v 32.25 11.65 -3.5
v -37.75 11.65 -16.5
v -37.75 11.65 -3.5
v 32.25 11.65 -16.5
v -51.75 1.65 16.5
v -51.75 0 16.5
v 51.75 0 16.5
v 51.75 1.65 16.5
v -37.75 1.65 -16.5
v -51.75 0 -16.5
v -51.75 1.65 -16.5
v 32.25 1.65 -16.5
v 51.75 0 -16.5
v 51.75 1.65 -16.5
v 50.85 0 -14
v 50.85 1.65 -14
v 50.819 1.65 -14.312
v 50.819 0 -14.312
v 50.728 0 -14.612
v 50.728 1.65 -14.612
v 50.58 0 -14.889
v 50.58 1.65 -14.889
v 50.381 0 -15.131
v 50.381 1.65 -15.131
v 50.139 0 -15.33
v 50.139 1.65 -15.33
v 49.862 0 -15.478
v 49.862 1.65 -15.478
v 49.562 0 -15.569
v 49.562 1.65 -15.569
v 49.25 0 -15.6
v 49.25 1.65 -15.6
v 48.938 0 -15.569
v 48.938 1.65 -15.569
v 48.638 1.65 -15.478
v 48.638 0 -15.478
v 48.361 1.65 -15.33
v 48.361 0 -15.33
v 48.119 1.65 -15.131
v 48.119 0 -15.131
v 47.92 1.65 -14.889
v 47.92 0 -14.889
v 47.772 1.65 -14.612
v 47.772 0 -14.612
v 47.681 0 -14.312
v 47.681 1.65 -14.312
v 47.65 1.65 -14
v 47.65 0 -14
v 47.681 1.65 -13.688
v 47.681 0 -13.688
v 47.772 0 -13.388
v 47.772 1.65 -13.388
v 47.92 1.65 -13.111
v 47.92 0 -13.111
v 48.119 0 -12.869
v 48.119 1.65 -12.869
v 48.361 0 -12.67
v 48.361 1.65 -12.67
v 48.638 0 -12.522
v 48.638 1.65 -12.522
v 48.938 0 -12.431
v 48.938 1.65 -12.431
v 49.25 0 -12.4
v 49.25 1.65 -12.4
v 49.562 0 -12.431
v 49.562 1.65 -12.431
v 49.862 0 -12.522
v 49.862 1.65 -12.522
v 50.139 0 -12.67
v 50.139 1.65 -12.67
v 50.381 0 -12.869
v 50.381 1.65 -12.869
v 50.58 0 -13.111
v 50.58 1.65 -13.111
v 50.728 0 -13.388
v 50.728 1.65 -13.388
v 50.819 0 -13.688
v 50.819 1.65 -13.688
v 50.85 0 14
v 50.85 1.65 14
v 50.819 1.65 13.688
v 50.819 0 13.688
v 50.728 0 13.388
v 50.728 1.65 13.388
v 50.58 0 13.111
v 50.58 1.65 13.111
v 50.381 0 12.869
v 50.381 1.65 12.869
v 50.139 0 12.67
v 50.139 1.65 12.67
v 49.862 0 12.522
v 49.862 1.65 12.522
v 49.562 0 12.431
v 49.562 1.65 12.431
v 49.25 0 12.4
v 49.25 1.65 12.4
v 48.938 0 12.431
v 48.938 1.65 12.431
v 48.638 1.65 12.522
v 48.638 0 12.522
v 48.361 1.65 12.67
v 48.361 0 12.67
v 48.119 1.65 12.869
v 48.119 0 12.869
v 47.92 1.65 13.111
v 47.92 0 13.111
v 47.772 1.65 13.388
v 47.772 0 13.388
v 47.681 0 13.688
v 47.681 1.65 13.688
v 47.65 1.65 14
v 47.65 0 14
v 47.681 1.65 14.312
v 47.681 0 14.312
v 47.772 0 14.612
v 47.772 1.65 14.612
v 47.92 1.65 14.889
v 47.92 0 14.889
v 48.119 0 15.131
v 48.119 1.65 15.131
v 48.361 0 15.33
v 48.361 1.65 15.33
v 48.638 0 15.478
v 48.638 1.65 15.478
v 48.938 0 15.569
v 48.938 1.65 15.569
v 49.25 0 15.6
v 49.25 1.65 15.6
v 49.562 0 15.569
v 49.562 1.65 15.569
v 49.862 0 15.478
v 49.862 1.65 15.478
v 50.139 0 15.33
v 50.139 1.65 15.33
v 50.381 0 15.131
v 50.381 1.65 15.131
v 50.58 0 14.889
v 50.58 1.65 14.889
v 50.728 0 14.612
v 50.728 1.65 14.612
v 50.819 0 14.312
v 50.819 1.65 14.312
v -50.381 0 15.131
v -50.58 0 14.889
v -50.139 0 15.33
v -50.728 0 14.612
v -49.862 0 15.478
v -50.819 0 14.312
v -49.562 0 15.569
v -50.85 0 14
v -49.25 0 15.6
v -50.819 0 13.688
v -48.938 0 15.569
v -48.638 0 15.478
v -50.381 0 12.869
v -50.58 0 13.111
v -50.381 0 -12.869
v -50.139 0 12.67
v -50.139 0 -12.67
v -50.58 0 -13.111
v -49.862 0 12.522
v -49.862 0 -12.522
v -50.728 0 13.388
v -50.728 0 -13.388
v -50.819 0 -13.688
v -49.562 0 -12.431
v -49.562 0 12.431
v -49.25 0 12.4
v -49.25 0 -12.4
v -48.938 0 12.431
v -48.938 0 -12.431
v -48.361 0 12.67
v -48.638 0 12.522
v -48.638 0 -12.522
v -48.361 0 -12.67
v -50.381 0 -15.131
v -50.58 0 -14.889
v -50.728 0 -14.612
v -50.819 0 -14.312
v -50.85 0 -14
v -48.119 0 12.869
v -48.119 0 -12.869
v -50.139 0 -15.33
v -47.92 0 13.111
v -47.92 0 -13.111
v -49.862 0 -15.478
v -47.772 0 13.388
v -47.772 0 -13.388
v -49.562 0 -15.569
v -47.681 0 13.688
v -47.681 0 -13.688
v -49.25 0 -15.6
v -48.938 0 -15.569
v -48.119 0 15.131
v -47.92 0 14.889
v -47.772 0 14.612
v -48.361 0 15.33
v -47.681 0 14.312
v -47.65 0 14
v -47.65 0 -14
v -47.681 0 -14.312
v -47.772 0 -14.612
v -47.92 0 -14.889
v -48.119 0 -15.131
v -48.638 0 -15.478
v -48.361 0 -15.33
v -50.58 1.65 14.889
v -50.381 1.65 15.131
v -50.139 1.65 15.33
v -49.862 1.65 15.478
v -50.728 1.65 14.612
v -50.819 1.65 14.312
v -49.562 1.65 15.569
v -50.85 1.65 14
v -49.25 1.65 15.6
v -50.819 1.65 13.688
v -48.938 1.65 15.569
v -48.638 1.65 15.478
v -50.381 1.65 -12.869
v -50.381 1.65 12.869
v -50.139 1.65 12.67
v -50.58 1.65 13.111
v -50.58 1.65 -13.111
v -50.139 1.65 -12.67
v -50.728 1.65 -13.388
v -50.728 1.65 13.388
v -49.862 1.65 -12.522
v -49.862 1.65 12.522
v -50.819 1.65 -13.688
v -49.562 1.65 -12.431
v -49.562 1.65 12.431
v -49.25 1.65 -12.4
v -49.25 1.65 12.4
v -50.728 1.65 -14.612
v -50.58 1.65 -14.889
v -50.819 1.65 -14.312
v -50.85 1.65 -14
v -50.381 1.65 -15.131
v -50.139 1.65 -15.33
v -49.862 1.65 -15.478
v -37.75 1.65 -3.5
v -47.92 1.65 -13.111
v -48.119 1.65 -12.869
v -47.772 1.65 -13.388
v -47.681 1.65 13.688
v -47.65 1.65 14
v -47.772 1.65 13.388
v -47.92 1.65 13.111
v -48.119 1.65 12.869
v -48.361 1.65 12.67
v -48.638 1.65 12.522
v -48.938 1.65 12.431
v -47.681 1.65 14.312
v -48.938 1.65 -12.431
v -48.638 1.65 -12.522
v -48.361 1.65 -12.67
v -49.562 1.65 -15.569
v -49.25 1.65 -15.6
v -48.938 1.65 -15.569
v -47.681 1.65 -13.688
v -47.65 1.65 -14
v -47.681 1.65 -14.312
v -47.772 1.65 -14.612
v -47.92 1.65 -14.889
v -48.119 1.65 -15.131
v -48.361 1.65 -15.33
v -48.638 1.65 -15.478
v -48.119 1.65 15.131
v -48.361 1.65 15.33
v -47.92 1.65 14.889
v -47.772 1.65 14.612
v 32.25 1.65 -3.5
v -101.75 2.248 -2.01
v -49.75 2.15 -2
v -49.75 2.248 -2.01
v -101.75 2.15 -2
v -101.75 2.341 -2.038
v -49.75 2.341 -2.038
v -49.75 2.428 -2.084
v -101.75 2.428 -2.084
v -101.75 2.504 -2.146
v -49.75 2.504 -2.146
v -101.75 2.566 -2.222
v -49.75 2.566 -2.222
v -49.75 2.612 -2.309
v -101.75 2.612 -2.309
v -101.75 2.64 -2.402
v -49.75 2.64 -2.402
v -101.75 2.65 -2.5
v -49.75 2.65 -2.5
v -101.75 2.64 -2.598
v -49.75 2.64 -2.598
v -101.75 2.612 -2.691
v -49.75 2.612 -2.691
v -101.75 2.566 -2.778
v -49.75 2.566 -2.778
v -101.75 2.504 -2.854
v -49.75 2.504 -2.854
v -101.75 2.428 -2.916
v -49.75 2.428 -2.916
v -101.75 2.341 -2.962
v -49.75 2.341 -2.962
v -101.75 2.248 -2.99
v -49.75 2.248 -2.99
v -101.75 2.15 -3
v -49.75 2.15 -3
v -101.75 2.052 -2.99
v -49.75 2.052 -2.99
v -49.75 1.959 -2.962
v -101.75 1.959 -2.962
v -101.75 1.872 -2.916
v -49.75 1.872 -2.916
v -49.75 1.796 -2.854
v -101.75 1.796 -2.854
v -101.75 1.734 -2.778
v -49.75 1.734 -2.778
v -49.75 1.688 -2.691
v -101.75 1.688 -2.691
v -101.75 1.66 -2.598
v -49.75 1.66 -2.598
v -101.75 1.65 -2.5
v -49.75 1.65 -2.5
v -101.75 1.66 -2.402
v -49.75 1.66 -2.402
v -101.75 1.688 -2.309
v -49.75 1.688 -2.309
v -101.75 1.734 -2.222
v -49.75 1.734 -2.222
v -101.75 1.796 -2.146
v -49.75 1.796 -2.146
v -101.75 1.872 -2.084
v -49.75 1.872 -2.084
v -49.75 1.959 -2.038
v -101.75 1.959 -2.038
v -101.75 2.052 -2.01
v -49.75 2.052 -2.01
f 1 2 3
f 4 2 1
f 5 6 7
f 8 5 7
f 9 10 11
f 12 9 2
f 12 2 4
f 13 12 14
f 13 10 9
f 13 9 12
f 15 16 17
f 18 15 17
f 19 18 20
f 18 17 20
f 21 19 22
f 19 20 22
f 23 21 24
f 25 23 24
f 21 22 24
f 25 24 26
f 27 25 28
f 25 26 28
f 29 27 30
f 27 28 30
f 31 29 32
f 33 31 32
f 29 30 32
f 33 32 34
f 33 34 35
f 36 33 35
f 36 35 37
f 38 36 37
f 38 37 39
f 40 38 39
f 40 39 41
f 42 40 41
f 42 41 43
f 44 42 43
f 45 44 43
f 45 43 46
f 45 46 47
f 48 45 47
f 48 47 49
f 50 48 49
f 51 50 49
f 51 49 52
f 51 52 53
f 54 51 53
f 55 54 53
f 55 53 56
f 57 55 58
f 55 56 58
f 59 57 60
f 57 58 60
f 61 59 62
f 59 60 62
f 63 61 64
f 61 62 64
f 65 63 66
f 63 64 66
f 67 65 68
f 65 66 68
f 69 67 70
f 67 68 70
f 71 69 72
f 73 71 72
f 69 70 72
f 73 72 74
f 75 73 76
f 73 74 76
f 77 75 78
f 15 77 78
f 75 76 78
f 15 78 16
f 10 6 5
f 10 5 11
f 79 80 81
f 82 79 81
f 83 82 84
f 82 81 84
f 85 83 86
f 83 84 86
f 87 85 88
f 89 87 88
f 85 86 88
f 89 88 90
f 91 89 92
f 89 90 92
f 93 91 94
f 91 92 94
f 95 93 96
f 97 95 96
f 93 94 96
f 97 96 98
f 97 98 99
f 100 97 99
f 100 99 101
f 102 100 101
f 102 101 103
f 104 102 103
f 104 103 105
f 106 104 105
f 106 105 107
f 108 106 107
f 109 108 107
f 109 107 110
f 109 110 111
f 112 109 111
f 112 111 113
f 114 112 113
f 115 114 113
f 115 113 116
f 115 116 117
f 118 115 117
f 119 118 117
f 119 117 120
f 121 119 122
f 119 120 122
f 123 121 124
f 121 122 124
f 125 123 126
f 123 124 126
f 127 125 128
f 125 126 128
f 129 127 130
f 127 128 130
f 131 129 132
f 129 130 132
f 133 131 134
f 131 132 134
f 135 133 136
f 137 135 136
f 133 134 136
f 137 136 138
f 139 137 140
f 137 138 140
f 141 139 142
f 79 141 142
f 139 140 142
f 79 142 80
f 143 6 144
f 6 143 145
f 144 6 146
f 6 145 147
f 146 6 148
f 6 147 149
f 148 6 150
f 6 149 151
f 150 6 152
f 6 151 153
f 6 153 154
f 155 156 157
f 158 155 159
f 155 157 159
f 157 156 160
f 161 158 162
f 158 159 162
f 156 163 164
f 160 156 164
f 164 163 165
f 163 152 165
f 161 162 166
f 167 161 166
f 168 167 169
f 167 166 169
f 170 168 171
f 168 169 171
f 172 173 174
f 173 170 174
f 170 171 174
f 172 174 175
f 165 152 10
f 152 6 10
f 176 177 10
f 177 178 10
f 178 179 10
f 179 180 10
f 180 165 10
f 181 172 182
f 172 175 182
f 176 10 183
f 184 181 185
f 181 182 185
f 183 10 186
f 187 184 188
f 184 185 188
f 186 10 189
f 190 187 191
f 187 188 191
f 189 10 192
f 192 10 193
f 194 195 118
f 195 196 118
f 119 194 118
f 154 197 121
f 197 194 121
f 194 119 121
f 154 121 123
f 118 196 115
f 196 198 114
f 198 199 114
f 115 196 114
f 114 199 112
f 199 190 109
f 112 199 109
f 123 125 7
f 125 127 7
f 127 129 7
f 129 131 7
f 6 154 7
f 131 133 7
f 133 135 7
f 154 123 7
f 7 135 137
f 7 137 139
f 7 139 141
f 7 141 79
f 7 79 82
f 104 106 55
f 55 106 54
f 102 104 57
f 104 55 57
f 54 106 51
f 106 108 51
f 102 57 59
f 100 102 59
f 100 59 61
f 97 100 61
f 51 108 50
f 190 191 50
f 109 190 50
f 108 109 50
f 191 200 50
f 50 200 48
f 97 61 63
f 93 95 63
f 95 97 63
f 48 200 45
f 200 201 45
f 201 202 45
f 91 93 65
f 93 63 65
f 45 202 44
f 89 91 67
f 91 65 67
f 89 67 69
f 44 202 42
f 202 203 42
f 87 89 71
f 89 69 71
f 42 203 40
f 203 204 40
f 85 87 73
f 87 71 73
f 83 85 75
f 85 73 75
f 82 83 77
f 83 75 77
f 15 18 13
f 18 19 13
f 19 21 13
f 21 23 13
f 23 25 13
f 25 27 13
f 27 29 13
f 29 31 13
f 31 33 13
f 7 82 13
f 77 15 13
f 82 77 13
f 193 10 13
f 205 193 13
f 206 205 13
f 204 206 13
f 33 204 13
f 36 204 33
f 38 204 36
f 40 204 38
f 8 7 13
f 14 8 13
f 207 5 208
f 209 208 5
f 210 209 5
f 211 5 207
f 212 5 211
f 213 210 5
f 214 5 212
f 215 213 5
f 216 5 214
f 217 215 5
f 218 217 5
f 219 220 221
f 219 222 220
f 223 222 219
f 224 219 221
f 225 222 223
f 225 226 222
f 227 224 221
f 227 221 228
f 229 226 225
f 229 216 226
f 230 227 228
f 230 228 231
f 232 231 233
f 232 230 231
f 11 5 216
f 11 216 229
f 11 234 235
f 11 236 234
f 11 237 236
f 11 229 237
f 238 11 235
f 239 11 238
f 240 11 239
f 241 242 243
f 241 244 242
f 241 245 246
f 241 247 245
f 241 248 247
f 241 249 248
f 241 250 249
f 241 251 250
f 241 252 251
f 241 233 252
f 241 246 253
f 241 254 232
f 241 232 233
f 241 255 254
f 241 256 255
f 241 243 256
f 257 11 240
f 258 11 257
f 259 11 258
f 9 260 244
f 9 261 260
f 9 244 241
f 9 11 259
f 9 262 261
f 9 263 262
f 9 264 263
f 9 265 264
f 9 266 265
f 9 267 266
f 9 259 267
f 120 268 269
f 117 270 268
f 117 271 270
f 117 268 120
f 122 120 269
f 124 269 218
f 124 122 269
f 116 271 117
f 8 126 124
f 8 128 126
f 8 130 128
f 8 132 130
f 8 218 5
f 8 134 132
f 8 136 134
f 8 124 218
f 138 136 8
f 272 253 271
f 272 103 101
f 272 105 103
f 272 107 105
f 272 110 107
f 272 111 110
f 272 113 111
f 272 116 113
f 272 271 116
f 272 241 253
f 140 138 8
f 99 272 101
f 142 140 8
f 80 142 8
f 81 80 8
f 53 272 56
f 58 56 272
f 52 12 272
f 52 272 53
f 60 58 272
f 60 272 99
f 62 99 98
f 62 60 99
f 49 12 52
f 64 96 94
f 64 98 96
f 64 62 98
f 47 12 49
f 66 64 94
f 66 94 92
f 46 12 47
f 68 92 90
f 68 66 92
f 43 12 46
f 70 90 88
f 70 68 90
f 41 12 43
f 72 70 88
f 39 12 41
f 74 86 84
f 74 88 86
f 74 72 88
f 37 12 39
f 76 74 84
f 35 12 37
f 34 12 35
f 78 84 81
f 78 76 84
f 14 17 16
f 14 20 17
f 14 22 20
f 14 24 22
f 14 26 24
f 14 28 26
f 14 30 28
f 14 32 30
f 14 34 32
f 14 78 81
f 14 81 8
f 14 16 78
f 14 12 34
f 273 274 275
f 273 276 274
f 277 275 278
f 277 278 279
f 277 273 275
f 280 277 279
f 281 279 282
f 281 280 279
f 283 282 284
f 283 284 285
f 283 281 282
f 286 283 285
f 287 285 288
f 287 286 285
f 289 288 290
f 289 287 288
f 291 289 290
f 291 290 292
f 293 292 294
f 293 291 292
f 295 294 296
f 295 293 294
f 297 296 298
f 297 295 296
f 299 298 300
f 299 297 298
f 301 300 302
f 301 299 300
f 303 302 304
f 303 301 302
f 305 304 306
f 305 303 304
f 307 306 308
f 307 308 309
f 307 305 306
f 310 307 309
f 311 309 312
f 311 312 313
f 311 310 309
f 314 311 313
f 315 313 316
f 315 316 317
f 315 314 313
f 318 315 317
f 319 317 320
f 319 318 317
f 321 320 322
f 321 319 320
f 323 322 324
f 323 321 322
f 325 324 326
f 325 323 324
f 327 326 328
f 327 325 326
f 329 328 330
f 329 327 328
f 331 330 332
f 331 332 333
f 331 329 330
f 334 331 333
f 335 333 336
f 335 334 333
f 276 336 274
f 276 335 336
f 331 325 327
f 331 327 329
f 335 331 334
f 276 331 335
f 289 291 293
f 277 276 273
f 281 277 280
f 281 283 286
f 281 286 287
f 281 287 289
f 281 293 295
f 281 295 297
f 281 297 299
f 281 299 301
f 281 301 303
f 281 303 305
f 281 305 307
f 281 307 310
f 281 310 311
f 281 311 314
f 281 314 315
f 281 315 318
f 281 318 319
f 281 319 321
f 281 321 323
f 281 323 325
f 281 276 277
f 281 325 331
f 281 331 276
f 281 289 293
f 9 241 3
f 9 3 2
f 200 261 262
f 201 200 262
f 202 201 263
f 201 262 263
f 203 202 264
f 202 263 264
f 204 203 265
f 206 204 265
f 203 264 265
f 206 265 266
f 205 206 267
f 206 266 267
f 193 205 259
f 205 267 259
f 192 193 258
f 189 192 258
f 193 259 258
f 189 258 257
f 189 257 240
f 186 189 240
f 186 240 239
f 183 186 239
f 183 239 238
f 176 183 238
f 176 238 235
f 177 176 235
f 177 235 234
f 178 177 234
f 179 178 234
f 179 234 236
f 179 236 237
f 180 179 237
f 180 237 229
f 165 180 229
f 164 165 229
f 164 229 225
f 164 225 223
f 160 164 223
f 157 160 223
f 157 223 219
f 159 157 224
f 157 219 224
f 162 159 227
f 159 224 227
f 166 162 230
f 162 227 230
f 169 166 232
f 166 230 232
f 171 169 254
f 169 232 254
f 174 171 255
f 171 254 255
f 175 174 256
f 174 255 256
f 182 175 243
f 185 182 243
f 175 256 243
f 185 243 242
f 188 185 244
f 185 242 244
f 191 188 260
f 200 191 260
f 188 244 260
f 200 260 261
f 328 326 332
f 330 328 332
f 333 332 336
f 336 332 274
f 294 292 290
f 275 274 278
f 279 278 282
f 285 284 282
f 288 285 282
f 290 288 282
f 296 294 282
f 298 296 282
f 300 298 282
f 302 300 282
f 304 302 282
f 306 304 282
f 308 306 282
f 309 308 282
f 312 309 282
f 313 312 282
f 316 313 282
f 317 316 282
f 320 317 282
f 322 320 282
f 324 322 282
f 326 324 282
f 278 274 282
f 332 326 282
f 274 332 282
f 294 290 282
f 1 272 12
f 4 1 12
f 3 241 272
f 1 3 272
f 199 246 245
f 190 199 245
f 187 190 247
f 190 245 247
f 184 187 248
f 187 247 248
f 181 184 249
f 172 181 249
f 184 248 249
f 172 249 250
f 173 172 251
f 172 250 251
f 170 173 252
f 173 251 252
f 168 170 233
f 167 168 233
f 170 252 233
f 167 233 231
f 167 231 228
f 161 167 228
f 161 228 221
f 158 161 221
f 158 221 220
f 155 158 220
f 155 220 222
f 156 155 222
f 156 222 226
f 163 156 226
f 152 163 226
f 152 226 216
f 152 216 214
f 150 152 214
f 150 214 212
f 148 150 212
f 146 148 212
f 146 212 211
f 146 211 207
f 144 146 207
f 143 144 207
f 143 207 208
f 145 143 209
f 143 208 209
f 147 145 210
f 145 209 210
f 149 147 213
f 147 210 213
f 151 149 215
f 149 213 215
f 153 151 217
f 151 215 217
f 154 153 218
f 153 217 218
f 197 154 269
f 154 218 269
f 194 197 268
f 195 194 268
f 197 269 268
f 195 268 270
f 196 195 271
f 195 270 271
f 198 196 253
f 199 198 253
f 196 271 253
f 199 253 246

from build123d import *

# Parameters (mm, degrees)
SKIZZE1_W                            = 103.5
SKIZZE1_H                            = 33
AUFSATZ_LINEAR_AUSTRAGEN1_DEPTH      = 1.65
SKIZZE3_R                            = 0.5
AUFSATZ_LINEAR_AUSTRAGEN2_DEPTH      = 50
AUFSATZ_LINEAR_AUSTRAGEN2_DEPTH_BACK = 2
SKIZZE4_W                            = 70
SKIZZE4_H                            = 13
AUFSATZ_LINEAR_AUSTRAGEN3_DEPTH      = 10
SKIZZE6_R                            = 1.6
SCHNITT_LINEAR_AUSTRAGEN1_DEPTH      = 2.65


with BuildPart() as part:
    # Skizze1 → Aufsatz-Linear austragen1 (new body)
    with BuildSketch(Plane(origin=(0, 0, 0), x_dir=(1, 0, 0), z_dir=(0, 1, 0))):
        Rectangle(SKIZZE1_W, SKIZZE1_H)
    extrude(amount=AUFSATZ_LINEAR_AUSTRAGEN1_DEPTH)

    # Skizze4 → Aufsatz-Linear austragen3 (add)
    with BuildSketch(Plane(origin=(0, 1.65, 0), x_dir=(1, 0, 0), z_dir=(0, 1, 0))):
        with Locations((-2.75, 10)):
            Rectangle(SKIZZE4_W, SKIZZE4_H)
    extrude(amount=AUFSATZ_LINEAR_AUSTRAGEN3_DEPTH)

    # Skizze6 → Schnitt-Linear austragen1 (cut, through all)
    with BuildSketch(Plane(origin=(0, 1.65, 0), x_dir=(1, 0, 0), z_dir=(0, 1, 0))):
        with Locations((-49.25, 14)):
            Circle(SKIZZE6_R)
        with Locations((49.25, 14)):
            Circle(SKIZZE6_R)
        with Locations((49.25, -14)):
            Circle(SKIZZE6_R)
        with Locations((-49.25, -14)):
            Circle(SKIZZE6_R)
    extrude(amount=-SCHNITT_LINEAR_AUSTRAGEN1_DEPTH, mode=Mode.SUBTRACT)


with BuildPart() as body_2:
    # Skizze3 → Aufsatz-Linear austragen2 (new body, two sides)
    with BuildSketch(Plane.ZY.offset(51.75)) as aufsatz_linear_austragen2_sk:
        with Locations((-2.5, 2.15)):
            Circle(SKIZZE3_R)
    extrude(amount=AUFSATZ_LINEAR_AUSTRAGEN2_DEPTH)
    extrude(aufsatz_linear_austragen2_sk.sketch, amount=-AUFSATZ_LINEAR_AUSTRAGEN2_DEPTH_BACK)


solid = Compound([part.part, body_2.part])
